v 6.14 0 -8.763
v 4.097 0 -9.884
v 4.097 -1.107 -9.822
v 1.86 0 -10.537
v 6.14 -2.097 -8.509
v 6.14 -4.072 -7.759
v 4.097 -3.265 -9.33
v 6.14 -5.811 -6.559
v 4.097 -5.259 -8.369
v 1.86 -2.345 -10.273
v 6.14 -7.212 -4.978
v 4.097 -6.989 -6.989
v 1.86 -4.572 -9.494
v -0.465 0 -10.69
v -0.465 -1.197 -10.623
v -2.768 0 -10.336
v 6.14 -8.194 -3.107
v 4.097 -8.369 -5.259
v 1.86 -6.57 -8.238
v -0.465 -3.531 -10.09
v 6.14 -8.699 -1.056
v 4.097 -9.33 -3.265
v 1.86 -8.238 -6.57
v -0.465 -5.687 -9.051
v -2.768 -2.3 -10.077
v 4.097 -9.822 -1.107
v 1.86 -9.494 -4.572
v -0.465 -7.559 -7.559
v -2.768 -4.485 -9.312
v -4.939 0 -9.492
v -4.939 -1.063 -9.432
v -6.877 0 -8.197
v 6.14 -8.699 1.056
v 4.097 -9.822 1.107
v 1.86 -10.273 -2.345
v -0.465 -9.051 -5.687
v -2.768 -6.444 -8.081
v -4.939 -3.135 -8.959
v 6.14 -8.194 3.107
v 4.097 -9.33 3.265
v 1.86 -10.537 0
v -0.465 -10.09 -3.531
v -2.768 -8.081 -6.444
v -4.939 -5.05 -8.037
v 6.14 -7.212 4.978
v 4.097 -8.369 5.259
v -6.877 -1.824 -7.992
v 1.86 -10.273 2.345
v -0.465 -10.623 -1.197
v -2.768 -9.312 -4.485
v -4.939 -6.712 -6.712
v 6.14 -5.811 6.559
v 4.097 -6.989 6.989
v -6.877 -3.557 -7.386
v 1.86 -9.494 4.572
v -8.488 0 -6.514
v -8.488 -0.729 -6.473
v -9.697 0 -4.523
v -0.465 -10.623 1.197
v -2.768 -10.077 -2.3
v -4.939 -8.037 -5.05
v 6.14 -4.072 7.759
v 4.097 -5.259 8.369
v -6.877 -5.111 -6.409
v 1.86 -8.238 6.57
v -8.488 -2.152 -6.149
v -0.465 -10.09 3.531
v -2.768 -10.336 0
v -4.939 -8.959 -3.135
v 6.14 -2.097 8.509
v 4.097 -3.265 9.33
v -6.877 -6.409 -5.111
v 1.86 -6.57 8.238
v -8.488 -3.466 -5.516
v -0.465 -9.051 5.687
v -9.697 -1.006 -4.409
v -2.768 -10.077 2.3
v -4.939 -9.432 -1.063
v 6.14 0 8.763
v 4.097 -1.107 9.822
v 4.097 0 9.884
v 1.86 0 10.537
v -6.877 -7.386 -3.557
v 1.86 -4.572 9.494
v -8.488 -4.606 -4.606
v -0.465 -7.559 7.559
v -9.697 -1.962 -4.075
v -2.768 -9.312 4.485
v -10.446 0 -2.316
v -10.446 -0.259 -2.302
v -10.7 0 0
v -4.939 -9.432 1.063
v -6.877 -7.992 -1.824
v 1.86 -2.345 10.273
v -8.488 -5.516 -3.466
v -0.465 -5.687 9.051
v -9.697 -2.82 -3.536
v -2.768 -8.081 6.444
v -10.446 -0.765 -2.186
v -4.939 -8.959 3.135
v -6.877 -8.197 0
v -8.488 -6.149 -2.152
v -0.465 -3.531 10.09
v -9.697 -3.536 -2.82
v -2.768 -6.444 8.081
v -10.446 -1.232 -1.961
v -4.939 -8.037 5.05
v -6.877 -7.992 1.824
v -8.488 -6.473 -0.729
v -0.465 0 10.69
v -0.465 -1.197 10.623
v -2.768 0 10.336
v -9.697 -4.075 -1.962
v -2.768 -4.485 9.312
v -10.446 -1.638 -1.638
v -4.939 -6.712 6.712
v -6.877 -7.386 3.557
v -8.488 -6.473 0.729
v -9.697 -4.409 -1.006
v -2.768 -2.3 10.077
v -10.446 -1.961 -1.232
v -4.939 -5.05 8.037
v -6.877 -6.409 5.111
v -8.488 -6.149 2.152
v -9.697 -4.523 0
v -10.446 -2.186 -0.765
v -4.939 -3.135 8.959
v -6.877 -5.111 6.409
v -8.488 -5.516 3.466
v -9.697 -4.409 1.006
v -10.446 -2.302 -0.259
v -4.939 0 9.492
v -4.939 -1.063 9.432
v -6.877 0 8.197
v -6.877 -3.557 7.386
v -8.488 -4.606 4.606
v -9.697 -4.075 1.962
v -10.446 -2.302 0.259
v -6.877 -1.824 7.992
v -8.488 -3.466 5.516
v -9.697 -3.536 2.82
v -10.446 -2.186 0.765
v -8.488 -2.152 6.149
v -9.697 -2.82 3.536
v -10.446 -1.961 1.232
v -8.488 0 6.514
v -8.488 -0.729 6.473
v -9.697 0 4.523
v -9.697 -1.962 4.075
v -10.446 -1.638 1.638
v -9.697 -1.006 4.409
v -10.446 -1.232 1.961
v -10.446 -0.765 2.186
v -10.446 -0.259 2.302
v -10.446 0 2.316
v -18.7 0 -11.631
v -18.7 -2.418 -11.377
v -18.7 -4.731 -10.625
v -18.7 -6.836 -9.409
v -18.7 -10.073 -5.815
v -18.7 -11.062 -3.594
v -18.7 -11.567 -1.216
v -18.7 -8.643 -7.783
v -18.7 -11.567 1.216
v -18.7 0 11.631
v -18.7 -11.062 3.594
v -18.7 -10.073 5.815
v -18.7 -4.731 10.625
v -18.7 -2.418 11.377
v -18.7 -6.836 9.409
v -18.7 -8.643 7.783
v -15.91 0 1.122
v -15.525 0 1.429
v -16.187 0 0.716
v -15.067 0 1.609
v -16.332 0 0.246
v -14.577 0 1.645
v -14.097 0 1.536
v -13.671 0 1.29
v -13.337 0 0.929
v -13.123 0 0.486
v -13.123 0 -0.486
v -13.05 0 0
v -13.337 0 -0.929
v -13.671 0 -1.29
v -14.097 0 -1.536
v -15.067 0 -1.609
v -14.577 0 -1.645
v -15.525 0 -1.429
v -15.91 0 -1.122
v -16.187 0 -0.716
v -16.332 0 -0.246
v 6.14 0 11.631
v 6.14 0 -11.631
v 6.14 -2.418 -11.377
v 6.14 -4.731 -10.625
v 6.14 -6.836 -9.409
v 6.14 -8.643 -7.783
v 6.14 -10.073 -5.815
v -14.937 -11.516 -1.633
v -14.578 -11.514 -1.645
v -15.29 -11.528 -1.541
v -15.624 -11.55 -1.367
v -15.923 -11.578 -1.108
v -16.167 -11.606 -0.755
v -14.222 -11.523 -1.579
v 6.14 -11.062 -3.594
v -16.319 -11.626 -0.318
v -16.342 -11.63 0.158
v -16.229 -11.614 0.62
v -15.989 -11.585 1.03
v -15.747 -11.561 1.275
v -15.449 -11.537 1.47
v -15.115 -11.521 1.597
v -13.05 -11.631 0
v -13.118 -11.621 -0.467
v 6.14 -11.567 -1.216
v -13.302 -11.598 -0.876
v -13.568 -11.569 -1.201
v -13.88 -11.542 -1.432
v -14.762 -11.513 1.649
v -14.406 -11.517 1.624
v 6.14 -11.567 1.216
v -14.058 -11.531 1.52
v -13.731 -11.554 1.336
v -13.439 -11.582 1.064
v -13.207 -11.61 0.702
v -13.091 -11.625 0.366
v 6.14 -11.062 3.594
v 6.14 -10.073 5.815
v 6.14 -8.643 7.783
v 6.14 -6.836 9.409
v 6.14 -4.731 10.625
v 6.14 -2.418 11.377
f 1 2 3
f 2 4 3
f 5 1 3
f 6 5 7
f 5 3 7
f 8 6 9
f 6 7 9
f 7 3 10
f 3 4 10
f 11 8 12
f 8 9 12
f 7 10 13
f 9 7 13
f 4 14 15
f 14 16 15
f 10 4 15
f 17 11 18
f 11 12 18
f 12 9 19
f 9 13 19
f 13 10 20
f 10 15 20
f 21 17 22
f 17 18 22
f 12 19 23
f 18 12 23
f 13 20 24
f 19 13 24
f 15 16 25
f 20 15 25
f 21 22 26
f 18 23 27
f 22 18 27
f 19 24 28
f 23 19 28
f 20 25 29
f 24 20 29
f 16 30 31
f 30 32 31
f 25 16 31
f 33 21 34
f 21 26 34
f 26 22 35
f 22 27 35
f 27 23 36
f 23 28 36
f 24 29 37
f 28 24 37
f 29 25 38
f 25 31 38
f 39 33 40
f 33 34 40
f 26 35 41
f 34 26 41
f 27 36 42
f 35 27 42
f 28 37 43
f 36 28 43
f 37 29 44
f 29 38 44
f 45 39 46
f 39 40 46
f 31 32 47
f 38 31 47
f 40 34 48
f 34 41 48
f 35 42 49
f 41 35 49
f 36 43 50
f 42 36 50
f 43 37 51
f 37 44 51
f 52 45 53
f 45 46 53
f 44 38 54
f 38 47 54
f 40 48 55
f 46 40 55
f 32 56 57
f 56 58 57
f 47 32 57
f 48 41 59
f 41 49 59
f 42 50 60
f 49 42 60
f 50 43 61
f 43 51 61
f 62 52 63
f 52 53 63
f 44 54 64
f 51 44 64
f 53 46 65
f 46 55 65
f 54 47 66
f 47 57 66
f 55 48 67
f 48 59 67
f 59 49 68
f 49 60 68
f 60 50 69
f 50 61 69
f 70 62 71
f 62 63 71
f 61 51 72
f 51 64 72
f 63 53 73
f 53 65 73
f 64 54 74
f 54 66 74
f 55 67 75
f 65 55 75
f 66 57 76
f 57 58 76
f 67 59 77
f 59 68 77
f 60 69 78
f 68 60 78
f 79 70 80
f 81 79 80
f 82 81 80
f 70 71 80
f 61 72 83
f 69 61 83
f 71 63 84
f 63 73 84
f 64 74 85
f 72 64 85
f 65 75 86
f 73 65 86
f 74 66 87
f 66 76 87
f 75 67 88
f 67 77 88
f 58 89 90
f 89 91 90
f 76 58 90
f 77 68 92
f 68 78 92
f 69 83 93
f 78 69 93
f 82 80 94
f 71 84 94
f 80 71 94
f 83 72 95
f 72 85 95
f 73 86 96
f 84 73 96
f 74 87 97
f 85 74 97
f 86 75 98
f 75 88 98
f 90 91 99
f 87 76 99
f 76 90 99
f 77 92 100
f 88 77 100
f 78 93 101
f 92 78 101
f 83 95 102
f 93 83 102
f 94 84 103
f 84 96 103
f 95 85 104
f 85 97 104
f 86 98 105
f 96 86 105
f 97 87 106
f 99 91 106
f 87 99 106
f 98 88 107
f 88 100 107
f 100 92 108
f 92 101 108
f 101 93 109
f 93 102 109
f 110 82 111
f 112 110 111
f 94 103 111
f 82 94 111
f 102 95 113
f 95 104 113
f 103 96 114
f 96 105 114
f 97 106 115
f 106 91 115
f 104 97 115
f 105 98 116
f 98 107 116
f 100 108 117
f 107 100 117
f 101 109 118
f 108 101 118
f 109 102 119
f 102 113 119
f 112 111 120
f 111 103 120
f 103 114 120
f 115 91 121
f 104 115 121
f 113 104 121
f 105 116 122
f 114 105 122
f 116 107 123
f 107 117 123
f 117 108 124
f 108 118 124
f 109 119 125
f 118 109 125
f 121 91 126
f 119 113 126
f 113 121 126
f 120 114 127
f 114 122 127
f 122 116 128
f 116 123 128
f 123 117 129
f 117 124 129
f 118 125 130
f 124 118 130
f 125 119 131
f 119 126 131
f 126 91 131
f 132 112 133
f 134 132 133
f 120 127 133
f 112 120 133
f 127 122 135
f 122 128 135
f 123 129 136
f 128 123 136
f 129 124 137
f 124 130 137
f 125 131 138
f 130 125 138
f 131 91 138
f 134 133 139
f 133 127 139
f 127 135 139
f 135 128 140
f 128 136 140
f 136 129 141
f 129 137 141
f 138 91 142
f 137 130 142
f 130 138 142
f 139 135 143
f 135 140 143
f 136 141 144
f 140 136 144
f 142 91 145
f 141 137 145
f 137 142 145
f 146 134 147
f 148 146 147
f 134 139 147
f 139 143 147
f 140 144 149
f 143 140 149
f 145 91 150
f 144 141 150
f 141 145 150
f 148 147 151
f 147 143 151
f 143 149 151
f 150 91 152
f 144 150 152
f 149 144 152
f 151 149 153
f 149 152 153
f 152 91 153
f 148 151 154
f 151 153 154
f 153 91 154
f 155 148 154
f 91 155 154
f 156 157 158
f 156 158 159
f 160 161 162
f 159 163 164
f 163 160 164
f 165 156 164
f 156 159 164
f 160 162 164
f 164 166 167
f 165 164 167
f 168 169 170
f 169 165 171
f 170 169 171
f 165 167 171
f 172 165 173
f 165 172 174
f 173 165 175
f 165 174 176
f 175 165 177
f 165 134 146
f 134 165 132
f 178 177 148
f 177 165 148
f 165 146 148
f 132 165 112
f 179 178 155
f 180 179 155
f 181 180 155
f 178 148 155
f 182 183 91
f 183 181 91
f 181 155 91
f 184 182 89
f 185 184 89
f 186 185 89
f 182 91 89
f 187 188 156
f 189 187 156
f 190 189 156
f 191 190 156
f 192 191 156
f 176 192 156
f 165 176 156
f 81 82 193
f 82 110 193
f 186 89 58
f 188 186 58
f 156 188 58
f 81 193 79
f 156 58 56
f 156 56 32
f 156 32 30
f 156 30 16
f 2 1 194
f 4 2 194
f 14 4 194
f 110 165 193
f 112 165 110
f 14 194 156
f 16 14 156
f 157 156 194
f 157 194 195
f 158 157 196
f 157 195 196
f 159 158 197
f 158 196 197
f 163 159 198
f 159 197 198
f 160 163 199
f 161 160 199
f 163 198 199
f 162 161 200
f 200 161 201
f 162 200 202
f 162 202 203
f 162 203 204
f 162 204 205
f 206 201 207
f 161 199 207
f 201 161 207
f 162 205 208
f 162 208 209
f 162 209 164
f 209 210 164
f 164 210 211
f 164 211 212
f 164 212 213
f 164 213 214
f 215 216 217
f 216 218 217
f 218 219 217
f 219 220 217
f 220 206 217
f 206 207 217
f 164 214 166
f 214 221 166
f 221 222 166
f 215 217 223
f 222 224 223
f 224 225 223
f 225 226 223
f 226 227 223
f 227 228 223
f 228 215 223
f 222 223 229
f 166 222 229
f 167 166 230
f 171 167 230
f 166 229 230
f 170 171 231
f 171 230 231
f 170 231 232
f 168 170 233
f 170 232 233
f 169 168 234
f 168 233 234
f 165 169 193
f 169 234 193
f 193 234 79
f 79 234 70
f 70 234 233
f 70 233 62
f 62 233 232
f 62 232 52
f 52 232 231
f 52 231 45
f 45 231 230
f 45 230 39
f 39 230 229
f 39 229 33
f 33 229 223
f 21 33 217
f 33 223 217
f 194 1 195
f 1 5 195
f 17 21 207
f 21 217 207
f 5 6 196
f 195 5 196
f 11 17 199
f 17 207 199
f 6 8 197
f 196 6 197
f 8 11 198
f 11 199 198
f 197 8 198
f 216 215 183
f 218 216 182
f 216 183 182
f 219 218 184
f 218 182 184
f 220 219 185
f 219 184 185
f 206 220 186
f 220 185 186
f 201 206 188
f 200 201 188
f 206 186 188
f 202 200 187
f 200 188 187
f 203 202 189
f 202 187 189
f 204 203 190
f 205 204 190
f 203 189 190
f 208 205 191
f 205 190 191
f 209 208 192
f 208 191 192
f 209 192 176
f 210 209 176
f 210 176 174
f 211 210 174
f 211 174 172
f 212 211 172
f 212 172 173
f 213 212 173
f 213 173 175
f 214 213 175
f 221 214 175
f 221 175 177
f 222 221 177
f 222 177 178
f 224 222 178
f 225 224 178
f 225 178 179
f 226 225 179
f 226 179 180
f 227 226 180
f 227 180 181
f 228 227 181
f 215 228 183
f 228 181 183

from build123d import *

# Parameters (mm, degrees)
CORTAR_EXTRUIR5_DEPTH = 50
CROQUIS8_R            = 1.65
CORTAR_EXTRUIR6_DEPTH = 50


with BuildPart() as part:
    # Croquis1 → Revolución4 (revolve)
    with BuildSketch(Plane(origin=(0, 0, 0), x_dir=(1, 0, 0), z_dir=(0, 1, 0))):
        with BuildLine():
            Line((-10.7, 0), (-18.7, 0))
            Line((-18.7, 0), (-18.7, 11.630777084))
            Line((-18.7, 11.630777084), (6.139681858, 11.630777084))
            Line((6.139681858, 11.630777084), (6.139681858, 8.763236085))
            ThreePointArc((6.139681858, 8.763236085), (-4.939403006, 9.491696263), (-10.7, 0))
        make_face()
    revolve(axis=Axis((-10.7, 0, 0), (-1, 0, 0)))

    # Croquis7 → Cortar-Extruir5 (cut)
    with BuildSketch(Plane(origin=(6.139681858, 0, 0), x_dir=(0, 0, -1), z_dir=(1, 0, 0))):
        Polygon((0, 0), (14.104035702, 0), (14.104035702, 12.472423118), (-13.194097915, 12.472423118), (-13.194097915, 0), align=None)
    extrude(amount=-CORTAR_EXTRUIR5_DEPTH, mode=Mode.SUBTRACT)

    # Croquis8 → Cortar-Extruir6 (cut)
    with BuildSketch(Plane(origin=(0, 0, 0), x_dir=(1, 0, 0), z_dir=(0, 1, 0))):
        with Locations((-14.7, 0)):
            Circle(CROQUIS8_R)
    extrude(amount=-CORTAR_EXTRUIR6_DEPTH, mode=Mode.SUBTRACT)


solid = part.part
